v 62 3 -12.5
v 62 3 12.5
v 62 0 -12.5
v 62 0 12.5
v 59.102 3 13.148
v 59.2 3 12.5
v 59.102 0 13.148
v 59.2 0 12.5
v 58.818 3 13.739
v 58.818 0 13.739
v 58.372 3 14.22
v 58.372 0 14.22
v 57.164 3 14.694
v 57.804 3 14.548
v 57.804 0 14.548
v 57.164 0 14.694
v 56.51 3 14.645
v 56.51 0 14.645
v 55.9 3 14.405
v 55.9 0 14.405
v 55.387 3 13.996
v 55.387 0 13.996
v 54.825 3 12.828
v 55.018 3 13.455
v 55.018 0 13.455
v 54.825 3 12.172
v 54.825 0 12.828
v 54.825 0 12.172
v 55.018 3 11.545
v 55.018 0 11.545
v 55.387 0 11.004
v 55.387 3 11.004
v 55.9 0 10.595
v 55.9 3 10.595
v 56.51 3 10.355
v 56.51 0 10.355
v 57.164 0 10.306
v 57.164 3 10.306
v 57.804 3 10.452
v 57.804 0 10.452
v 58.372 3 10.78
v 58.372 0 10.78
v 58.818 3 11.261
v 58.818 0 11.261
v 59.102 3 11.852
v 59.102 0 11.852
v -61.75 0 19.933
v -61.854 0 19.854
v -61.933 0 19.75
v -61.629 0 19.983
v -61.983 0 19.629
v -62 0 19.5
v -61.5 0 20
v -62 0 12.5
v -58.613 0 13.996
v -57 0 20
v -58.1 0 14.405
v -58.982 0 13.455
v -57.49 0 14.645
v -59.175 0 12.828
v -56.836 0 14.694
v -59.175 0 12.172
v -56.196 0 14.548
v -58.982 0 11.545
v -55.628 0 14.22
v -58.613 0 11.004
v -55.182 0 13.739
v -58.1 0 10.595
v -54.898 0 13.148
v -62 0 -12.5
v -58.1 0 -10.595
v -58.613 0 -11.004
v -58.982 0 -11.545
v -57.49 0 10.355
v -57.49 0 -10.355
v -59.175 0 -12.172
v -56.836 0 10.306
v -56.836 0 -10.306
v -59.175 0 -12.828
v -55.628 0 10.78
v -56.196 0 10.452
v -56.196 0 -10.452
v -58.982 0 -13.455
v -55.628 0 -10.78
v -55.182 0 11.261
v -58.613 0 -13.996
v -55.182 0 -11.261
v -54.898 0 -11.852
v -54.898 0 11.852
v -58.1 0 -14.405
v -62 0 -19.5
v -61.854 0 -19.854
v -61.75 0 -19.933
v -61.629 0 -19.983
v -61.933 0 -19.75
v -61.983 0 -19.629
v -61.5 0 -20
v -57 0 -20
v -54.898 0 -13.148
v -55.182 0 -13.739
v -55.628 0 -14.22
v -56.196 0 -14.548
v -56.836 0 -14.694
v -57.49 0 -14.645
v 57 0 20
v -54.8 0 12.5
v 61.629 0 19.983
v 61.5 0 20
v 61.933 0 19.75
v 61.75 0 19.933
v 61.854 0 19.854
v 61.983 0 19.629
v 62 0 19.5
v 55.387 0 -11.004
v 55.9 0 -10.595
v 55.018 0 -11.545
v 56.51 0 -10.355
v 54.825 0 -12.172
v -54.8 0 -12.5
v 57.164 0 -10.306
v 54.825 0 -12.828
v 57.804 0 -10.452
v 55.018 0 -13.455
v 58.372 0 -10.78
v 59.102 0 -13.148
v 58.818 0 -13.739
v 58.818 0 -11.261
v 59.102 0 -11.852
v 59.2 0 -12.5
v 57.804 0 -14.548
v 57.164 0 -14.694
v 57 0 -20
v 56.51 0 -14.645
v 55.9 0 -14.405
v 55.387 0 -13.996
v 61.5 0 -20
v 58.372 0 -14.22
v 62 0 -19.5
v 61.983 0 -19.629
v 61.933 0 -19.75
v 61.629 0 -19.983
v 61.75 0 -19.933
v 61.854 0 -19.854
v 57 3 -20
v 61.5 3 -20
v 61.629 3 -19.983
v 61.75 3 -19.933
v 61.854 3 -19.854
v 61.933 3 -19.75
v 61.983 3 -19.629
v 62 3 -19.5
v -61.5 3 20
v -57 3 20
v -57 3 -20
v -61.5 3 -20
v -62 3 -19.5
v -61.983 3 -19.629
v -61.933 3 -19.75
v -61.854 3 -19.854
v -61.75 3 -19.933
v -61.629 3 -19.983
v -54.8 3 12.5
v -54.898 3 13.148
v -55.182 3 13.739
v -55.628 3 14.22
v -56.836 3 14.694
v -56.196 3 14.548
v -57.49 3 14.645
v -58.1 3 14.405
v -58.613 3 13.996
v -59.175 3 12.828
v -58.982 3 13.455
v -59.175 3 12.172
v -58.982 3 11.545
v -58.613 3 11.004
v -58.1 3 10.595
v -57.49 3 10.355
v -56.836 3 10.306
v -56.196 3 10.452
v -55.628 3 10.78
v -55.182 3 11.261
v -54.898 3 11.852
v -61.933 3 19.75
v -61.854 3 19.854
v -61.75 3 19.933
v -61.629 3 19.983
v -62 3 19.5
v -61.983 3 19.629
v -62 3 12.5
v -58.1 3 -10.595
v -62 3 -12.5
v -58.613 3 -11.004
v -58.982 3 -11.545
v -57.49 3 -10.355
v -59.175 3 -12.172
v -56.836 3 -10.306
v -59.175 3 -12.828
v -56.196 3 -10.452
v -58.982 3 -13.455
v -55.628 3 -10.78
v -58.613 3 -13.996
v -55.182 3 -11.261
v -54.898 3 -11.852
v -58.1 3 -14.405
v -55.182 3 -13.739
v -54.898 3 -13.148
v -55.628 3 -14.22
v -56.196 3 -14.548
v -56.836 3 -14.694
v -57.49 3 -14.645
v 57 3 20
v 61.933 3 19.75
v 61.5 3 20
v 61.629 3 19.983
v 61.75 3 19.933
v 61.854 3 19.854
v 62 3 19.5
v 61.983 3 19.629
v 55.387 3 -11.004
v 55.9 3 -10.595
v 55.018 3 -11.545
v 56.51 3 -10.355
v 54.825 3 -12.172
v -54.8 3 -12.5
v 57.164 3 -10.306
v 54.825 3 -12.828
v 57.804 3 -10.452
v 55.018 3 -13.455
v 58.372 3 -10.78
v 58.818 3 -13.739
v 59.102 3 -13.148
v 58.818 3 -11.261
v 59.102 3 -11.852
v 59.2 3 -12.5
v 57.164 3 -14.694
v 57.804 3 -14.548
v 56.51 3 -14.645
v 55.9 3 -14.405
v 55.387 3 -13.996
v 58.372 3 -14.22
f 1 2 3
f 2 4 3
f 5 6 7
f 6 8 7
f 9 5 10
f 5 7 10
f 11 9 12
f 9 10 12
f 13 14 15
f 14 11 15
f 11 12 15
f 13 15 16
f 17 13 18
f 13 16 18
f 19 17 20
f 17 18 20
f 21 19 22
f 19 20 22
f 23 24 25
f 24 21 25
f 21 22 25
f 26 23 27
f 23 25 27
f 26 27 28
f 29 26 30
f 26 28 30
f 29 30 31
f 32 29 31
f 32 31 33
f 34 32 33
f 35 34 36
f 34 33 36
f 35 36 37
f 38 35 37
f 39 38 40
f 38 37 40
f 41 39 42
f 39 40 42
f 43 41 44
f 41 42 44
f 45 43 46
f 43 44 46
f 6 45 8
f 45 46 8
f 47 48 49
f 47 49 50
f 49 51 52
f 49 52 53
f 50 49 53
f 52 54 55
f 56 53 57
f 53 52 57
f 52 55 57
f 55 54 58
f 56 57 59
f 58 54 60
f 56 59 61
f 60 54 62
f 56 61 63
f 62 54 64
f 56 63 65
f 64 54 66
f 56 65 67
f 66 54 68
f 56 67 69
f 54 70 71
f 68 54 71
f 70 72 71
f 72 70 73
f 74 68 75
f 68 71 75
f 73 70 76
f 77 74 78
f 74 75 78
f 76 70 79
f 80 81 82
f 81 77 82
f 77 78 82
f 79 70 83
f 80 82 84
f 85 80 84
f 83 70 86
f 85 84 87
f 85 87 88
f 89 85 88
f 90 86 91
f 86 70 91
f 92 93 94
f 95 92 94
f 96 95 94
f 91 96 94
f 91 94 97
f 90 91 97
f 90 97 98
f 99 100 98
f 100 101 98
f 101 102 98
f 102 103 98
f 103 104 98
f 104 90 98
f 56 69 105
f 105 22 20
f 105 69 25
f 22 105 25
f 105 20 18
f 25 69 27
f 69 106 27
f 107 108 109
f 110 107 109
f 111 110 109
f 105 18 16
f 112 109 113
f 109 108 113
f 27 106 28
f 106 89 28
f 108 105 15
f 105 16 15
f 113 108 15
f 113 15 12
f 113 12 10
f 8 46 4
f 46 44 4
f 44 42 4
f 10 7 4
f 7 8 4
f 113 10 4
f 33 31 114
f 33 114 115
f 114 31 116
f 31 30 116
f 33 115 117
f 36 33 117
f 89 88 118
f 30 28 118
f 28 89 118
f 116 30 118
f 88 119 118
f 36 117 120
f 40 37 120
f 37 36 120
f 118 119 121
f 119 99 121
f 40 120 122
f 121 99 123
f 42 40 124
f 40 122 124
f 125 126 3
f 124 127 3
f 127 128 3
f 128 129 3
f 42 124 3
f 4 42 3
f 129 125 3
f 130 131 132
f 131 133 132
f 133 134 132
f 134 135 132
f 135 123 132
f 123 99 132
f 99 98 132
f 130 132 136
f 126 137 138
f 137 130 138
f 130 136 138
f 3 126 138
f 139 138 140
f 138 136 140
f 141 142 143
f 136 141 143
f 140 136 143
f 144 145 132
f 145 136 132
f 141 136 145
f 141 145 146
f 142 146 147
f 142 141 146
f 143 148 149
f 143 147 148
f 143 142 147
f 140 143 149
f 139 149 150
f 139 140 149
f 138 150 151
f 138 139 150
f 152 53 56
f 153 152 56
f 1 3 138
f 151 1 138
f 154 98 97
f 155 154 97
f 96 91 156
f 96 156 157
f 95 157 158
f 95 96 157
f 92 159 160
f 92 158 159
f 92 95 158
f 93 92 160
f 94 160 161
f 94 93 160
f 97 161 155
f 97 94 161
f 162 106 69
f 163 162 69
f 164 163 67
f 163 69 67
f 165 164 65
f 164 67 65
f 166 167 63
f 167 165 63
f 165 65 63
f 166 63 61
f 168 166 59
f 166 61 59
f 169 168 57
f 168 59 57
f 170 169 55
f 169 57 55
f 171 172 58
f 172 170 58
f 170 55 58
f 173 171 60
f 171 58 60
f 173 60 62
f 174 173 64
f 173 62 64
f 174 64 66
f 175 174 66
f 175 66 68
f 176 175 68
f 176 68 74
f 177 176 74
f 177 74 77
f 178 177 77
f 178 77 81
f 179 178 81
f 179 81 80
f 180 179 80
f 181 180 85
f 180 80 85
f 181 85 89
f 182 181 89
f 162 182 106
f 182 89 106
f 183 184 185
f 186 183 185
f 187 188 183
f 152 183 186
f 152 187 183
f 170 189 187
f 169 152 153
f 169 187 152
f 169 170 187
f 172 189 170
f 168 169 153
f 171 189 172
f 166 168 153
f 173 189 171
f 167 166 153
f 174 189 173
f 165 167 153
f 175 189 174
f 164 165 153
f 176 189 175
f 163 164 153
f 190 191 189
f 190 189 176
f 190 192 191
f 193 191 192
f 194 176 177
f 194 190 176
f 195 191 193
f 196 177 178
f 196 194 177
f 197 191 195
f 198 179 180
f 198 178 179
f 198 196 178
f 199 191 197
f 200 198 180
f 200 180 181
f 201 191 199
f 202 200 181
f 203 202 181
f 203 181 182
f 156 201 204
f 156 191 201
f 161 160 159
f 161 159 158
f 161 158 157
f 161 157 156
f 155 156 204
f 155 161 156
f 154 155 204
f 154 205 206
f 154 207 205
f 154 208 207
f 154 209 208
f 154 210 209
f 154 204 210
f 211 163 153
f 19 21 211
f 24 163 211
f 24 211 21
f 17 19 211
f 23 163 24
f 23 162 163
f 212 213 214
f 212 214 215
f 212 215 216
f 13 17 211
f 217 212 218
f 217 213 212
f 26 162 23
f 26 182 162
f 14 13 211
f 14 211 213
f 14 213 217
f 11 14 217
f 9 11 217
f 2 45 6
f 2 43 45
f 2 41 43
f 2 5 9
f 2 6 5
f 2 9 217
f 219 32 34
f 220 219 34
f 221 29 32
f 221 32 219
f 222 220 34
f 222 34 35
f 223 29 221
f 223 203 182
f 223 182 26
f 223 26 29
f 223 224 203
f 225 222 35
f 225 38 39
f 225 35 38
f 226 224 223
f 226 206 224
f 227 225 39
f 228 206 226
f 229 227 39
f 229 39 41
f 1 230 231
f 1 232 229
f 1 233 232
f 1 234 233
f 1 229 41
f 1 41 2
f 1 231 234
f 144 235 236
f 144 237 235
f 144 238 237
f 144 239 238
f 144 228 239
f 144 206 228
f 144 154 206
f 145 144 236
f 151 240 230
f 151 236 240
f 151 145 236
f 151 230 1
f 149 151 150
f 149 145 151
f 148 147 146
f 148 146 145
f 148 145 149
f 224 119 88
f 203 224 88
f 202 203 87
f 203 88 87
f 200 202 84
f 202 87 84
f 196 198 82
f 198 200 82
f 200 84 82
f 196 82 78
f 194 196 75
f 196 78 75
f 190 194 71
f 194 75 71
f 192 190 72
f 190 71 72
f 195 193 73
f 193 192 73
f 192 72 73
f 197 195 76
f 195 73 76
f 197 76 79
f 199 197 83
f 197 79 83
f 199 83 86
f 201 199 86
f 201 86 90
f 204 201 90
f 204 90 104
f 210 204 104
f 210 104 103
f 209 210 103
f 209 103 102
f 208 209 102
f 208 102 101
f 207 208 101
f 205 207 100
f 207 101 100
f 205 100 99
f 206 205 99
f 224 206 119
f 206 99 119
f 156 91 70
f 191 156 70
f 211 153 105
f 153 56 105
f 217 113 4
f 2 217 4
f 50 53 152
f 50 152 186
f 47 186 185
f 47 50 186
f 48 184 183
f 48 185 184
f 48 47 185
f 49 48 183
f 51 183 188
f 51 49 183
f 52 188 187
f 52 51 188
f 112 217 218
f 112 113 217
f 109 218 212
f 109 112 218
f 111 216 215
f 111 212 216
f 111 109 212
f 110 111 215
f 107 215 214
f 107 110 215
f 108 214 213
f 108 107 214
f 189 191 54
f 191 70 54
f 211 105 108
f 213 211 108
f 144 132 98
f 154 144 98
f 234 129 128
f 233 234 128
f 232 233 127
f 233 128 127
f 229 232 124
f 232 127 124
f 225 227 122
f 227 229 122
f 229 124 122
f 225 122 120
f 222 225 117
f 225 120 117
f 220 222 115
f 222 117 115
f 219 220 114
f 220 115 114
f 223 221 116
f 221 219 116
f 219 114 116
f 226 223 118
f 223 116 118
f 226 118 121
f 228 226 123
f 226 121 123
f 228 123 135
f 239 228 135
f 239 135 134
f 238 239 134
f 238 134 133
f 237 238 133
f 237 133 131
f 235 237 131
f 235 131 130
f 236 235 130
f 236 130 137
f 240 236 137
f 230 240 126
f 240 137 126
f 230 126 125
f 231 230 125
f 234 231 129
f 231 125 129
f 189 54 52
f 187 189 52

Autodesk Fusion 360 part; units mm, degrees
sketch "Sketch1" plane through (0, 0, 0) normal (0, 1, 0) x (1, 0, 0)
  line L0 (-61.5, -20) -> (61.5, -20)
  line L1 (62, -19.5) -> (62, 19.5)
  line L2 (61.5, 20) -> (-61.5, 20)
  line L3 (-62, 19.5) -> (-62, -19.5)
  line L4 (-62, -20) -> (62, 20) construction
  line L5 (62, -20) -> (-62, 20) construction
  line L6 (62, 20) -> (57, 20)
  line L7 (57, 20) -> (57, 12.5) construction
  line L8 (57, 12.5) -> (62, 12.5) construction
  line L9 (62, 12.5) -> (62, 20)
  line L10 (62, -20) -> (57, -20)
  line L11 (57, -20) -> (57, -12.5) construction
  line L12 (57, -12.5) -> (62, -12.5) construction
  line L13 (62, -12.5) -> (62, -20)
  line L14 (-62, -20) -> (-57, -20)
  line L15 (-57, -20) -> (-57, -12.5) construction
  line L16 (-57, -12.5) -> (-62, -12.5) construction
  line L17 (-62, -12.5) -> (-62, -20)
  line L18 (-62, 20) -> (-57, 20)
  line L19 (-57, 20) -> (-57, 12.5) construction
  line L20 (-57, 12.5) -> (-62, 12.5) construction
  line L21 (-62, 12.5) -> (-62, 20)
  circle A0 centre (57, -12.5) radius 2.2
  circle A1 centre (-57, -12.5) radius 2.2
  circle A2 centre (57, 12.5) radius 2.2
  circle A3 centre (-57, 12.5) radius 2.2
  arc A4 (61.5, -20) -> (62, -19.5) centre (61.5, -19.5) ccw
  arc A5 (-62, -19.5) -> (-61.5, -20) centre (-61.5, -19.5) ccw
  arc A6 (-61.5, 20) -> (-62, 19.5) centre (-61.5, 19.5) ccw
  arc A7 (62, 19.5) -> (61.5, 20) centre (61.5, 19.5) ccw
  dimension "d1" = 124
  dimension "d2" = 40
  dimension "d3" = 5
  dimension "d4" = 7.5
  dimension "d5" = 5
  dimension "d6" = 7.5
  dimension "d7" = 5
  dimension "d8" = 7.5
  dimension "d9" = 5
  dimension "d10" = 7.5
  dimension "d11" = 4.4
  dimension "d12" = 4.4
  dimension "d13" = 4.4
  dimension "d14" = 4.4
  dimension "d15" = 0.5
extrude "Extrude1" add sketch "Sketch1" along normal blind 3 contours L0 L1 L2 L3 L6 L9 L10 L13 L14 L17 L18 L21 A4 A5 A6 A7
